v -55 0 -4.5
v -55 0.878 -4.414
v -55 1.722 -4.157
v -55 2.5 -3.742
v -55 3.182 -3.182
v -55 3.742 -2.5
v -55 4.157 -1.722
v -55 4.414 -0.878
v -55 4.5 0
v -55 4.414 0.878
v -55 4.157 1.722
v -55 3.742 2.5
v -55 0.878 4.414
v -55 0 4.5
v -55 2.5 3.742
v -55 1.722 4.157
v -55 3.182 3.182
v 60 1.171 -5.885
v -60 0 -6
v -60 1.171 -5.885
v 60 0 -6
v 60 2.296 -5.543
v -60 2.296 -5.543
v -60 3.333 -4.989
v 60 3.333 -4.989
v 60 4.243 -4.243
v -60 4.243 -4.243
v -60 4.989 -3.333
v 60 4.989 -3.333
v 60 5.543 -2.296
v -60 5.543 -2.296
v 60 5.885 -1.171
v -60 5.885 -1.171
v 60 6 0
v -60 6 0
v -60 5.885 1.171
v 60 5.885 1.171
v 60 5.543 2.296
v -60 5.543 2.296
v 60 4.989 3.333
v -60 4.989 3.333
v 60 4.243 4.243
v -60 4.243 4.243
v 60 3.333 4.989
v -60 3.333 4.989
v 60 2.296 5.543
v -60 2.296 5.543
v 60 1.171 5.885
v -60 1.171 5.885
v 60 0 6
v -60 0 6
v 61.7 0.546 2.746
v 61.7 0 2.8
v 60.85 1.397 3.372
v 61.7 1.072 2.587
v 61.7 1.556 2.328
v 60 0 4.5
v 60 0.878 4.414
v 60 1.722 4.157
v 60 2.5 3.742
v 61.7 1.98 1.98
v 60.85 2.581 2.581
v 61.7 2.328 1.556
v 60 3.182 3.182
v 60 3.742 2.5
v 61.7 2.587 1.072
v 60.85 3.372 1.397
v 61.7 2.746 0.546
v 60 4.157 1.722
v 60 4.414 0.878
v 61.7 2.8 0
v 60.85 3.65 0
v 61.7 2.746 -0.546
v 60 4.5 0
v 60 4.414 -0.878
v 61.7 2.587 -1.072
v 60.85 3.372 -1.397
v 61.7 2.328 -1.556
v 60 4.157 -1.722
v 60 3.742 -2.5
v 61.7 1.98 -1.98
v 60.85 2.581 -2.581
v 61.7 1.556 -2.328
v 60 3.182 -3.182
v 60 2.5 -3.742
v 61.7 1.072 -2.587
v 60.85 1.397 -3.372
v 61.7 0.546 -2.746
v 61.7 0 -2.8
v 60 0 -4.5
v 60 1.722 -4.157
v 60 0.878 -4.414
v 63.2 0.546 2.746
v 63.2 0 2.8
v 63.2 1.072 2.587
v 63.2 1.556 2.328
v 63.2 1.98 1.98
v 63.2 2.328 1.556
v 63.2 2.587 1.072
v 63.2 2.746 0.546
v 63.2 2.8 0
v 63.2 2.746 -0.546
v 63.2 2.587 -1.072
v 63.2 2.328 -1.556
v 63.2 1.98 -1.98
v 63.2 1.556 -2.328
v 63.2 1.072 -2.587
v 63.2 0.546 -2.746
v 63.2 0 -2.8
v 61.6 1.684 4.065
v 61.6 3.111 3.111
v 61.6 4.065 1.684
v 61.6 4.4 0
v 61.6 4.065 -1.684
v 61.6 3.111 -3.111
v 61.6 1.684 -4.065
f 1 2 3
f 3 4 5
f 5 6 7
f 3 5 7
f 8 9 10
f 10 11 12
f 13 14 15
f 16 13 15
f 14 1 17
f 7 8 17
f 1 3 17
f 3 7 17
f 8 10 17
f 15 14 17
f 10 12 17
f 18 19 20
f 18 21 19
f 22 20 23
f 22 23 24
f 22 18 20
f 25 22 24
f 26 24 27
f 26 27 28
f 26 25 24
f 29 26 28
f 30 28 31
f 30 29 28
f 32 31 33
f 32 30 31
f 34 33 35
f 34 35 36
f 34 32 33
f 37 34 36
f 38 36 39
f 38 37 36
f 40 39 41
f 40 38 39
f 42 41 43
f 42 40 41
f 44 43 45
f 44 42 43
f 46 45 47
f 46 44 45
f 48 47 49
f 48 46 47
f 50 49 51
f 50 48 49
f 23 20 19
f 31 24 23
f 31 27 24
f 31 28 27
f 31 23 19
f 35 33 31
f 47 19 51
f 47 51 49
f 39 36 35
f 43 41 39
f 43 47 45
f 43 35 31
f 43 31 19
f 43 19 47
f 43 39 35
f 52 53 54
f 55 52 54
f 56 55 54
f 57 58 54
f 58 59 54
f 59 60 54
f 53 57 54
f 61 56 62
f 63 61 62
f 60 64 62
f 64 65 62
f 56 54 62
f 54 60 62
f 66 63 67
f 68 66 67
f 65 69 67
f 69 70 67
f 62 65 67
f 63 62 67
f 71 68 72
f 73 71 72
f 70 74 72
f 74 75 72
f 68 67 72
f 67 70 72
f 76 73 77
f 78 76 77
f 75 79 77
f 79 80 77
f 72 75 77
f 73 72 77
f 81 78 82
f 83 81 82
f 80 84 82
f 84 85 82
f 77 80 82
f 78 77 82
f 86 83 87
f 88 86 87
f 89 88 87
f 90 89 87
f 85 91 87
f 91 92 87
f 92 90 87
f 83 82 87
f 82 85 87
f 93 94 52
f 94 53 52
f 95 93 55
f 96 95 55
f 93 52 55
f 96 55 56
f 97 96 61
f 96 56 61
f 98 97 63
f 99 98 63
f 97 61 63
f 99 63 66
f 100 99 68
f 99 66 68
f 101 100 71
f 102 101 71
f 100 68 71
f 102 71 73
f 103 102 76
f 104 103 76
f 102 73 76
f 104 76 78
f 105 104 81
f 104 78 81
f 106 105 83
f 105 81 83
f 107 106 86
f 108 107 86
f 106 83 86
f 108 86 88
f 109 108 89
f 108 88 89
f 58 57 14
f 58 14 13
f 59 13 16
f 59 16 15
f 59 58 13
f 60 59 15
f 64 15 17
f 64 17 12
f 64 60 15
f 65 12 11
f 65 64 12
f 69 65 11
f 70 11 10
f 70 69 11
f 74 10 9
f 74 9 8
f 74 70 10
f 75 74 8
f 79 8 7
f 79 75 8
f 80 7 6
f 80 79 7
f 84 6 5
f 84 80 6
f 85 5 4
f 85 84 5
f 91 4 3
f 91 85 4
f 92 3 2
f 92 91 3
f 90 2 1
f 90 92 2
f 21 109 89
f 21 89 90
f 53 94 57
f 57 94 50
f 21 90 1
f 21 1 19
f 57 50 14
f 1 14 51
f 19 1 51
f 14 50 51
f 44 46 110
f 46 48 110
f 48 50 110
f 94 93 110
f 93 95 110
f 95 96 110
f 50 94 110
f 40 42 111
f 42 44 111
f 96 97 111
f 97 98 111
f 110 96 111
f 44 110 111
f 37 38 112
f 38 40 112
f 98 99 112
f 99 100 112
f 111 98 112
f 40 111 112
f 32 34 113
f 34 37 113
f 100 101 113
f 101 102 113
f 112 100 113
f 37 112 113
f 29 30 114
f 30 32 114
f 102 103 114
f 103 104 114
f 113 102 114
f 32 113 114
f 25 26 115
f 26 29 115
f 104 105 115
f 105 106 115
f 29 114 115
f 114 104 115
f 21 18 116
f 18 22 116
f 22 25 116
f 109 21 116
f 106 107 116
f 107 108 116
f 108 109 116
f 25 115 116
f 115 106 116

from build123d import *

# Parameters (mm, degrees)
BOSS_EXTRUDE1_DEPTH = 60
BOSS_EXTRUDE2_START = -5
BOSS_EXTRUDE2_DEPTH = 5
REVOLVE1_ANGLE      = 180


with BuildPart() as part:
    # Sketch1 → Boss-Extrude1 (new, symmetric)
    with BuildSketch(Plane(origin=(0, 0, 0), x_dir=(0, 0, -1), z_dir=(1, 0, 0))):
        with BuildLine():
            Line((-6, 0), (-4.5, 0))
            ThreePointArc((-4.5, 0), (0, 4.5), (4.5, 0))
            Line((4.5, 0), (6, 0))
            ThreePointArc((6, 0), (0, 6), (-6, 0))
        make_face()
    extrude(amount=BOSS_EXTRUDE1_DEPTH, both=True)

    # Sketch2 → Boss-Extrude2 (add)
    with BuildSketch(Plane.ZY.offset(60).offset(BOSS_EXTRUDE2_START)):
        with BuildLine():
            Line((-4.5, 0), (4.5, 0))
            ThreePointArc((4.5, 0), (0, 4.5), (-4.5, 0))
        make_face()
    extrude(amount=BOSS_EXTRUDE2_DEPTH)

    # Sketch3 → Revolve1 (revolve)
    with BuildSketch(Plane.XZ):
        Polygon((60, 6), (63.2, 2.8), (61.7, 2.8), (60, 4.5), align=None)
    revolve(axis=Axis((0, 0, 0), (-1, 0, 0)), revolution_arc=REVOLVE1_ANGLE)


solid = part.part
